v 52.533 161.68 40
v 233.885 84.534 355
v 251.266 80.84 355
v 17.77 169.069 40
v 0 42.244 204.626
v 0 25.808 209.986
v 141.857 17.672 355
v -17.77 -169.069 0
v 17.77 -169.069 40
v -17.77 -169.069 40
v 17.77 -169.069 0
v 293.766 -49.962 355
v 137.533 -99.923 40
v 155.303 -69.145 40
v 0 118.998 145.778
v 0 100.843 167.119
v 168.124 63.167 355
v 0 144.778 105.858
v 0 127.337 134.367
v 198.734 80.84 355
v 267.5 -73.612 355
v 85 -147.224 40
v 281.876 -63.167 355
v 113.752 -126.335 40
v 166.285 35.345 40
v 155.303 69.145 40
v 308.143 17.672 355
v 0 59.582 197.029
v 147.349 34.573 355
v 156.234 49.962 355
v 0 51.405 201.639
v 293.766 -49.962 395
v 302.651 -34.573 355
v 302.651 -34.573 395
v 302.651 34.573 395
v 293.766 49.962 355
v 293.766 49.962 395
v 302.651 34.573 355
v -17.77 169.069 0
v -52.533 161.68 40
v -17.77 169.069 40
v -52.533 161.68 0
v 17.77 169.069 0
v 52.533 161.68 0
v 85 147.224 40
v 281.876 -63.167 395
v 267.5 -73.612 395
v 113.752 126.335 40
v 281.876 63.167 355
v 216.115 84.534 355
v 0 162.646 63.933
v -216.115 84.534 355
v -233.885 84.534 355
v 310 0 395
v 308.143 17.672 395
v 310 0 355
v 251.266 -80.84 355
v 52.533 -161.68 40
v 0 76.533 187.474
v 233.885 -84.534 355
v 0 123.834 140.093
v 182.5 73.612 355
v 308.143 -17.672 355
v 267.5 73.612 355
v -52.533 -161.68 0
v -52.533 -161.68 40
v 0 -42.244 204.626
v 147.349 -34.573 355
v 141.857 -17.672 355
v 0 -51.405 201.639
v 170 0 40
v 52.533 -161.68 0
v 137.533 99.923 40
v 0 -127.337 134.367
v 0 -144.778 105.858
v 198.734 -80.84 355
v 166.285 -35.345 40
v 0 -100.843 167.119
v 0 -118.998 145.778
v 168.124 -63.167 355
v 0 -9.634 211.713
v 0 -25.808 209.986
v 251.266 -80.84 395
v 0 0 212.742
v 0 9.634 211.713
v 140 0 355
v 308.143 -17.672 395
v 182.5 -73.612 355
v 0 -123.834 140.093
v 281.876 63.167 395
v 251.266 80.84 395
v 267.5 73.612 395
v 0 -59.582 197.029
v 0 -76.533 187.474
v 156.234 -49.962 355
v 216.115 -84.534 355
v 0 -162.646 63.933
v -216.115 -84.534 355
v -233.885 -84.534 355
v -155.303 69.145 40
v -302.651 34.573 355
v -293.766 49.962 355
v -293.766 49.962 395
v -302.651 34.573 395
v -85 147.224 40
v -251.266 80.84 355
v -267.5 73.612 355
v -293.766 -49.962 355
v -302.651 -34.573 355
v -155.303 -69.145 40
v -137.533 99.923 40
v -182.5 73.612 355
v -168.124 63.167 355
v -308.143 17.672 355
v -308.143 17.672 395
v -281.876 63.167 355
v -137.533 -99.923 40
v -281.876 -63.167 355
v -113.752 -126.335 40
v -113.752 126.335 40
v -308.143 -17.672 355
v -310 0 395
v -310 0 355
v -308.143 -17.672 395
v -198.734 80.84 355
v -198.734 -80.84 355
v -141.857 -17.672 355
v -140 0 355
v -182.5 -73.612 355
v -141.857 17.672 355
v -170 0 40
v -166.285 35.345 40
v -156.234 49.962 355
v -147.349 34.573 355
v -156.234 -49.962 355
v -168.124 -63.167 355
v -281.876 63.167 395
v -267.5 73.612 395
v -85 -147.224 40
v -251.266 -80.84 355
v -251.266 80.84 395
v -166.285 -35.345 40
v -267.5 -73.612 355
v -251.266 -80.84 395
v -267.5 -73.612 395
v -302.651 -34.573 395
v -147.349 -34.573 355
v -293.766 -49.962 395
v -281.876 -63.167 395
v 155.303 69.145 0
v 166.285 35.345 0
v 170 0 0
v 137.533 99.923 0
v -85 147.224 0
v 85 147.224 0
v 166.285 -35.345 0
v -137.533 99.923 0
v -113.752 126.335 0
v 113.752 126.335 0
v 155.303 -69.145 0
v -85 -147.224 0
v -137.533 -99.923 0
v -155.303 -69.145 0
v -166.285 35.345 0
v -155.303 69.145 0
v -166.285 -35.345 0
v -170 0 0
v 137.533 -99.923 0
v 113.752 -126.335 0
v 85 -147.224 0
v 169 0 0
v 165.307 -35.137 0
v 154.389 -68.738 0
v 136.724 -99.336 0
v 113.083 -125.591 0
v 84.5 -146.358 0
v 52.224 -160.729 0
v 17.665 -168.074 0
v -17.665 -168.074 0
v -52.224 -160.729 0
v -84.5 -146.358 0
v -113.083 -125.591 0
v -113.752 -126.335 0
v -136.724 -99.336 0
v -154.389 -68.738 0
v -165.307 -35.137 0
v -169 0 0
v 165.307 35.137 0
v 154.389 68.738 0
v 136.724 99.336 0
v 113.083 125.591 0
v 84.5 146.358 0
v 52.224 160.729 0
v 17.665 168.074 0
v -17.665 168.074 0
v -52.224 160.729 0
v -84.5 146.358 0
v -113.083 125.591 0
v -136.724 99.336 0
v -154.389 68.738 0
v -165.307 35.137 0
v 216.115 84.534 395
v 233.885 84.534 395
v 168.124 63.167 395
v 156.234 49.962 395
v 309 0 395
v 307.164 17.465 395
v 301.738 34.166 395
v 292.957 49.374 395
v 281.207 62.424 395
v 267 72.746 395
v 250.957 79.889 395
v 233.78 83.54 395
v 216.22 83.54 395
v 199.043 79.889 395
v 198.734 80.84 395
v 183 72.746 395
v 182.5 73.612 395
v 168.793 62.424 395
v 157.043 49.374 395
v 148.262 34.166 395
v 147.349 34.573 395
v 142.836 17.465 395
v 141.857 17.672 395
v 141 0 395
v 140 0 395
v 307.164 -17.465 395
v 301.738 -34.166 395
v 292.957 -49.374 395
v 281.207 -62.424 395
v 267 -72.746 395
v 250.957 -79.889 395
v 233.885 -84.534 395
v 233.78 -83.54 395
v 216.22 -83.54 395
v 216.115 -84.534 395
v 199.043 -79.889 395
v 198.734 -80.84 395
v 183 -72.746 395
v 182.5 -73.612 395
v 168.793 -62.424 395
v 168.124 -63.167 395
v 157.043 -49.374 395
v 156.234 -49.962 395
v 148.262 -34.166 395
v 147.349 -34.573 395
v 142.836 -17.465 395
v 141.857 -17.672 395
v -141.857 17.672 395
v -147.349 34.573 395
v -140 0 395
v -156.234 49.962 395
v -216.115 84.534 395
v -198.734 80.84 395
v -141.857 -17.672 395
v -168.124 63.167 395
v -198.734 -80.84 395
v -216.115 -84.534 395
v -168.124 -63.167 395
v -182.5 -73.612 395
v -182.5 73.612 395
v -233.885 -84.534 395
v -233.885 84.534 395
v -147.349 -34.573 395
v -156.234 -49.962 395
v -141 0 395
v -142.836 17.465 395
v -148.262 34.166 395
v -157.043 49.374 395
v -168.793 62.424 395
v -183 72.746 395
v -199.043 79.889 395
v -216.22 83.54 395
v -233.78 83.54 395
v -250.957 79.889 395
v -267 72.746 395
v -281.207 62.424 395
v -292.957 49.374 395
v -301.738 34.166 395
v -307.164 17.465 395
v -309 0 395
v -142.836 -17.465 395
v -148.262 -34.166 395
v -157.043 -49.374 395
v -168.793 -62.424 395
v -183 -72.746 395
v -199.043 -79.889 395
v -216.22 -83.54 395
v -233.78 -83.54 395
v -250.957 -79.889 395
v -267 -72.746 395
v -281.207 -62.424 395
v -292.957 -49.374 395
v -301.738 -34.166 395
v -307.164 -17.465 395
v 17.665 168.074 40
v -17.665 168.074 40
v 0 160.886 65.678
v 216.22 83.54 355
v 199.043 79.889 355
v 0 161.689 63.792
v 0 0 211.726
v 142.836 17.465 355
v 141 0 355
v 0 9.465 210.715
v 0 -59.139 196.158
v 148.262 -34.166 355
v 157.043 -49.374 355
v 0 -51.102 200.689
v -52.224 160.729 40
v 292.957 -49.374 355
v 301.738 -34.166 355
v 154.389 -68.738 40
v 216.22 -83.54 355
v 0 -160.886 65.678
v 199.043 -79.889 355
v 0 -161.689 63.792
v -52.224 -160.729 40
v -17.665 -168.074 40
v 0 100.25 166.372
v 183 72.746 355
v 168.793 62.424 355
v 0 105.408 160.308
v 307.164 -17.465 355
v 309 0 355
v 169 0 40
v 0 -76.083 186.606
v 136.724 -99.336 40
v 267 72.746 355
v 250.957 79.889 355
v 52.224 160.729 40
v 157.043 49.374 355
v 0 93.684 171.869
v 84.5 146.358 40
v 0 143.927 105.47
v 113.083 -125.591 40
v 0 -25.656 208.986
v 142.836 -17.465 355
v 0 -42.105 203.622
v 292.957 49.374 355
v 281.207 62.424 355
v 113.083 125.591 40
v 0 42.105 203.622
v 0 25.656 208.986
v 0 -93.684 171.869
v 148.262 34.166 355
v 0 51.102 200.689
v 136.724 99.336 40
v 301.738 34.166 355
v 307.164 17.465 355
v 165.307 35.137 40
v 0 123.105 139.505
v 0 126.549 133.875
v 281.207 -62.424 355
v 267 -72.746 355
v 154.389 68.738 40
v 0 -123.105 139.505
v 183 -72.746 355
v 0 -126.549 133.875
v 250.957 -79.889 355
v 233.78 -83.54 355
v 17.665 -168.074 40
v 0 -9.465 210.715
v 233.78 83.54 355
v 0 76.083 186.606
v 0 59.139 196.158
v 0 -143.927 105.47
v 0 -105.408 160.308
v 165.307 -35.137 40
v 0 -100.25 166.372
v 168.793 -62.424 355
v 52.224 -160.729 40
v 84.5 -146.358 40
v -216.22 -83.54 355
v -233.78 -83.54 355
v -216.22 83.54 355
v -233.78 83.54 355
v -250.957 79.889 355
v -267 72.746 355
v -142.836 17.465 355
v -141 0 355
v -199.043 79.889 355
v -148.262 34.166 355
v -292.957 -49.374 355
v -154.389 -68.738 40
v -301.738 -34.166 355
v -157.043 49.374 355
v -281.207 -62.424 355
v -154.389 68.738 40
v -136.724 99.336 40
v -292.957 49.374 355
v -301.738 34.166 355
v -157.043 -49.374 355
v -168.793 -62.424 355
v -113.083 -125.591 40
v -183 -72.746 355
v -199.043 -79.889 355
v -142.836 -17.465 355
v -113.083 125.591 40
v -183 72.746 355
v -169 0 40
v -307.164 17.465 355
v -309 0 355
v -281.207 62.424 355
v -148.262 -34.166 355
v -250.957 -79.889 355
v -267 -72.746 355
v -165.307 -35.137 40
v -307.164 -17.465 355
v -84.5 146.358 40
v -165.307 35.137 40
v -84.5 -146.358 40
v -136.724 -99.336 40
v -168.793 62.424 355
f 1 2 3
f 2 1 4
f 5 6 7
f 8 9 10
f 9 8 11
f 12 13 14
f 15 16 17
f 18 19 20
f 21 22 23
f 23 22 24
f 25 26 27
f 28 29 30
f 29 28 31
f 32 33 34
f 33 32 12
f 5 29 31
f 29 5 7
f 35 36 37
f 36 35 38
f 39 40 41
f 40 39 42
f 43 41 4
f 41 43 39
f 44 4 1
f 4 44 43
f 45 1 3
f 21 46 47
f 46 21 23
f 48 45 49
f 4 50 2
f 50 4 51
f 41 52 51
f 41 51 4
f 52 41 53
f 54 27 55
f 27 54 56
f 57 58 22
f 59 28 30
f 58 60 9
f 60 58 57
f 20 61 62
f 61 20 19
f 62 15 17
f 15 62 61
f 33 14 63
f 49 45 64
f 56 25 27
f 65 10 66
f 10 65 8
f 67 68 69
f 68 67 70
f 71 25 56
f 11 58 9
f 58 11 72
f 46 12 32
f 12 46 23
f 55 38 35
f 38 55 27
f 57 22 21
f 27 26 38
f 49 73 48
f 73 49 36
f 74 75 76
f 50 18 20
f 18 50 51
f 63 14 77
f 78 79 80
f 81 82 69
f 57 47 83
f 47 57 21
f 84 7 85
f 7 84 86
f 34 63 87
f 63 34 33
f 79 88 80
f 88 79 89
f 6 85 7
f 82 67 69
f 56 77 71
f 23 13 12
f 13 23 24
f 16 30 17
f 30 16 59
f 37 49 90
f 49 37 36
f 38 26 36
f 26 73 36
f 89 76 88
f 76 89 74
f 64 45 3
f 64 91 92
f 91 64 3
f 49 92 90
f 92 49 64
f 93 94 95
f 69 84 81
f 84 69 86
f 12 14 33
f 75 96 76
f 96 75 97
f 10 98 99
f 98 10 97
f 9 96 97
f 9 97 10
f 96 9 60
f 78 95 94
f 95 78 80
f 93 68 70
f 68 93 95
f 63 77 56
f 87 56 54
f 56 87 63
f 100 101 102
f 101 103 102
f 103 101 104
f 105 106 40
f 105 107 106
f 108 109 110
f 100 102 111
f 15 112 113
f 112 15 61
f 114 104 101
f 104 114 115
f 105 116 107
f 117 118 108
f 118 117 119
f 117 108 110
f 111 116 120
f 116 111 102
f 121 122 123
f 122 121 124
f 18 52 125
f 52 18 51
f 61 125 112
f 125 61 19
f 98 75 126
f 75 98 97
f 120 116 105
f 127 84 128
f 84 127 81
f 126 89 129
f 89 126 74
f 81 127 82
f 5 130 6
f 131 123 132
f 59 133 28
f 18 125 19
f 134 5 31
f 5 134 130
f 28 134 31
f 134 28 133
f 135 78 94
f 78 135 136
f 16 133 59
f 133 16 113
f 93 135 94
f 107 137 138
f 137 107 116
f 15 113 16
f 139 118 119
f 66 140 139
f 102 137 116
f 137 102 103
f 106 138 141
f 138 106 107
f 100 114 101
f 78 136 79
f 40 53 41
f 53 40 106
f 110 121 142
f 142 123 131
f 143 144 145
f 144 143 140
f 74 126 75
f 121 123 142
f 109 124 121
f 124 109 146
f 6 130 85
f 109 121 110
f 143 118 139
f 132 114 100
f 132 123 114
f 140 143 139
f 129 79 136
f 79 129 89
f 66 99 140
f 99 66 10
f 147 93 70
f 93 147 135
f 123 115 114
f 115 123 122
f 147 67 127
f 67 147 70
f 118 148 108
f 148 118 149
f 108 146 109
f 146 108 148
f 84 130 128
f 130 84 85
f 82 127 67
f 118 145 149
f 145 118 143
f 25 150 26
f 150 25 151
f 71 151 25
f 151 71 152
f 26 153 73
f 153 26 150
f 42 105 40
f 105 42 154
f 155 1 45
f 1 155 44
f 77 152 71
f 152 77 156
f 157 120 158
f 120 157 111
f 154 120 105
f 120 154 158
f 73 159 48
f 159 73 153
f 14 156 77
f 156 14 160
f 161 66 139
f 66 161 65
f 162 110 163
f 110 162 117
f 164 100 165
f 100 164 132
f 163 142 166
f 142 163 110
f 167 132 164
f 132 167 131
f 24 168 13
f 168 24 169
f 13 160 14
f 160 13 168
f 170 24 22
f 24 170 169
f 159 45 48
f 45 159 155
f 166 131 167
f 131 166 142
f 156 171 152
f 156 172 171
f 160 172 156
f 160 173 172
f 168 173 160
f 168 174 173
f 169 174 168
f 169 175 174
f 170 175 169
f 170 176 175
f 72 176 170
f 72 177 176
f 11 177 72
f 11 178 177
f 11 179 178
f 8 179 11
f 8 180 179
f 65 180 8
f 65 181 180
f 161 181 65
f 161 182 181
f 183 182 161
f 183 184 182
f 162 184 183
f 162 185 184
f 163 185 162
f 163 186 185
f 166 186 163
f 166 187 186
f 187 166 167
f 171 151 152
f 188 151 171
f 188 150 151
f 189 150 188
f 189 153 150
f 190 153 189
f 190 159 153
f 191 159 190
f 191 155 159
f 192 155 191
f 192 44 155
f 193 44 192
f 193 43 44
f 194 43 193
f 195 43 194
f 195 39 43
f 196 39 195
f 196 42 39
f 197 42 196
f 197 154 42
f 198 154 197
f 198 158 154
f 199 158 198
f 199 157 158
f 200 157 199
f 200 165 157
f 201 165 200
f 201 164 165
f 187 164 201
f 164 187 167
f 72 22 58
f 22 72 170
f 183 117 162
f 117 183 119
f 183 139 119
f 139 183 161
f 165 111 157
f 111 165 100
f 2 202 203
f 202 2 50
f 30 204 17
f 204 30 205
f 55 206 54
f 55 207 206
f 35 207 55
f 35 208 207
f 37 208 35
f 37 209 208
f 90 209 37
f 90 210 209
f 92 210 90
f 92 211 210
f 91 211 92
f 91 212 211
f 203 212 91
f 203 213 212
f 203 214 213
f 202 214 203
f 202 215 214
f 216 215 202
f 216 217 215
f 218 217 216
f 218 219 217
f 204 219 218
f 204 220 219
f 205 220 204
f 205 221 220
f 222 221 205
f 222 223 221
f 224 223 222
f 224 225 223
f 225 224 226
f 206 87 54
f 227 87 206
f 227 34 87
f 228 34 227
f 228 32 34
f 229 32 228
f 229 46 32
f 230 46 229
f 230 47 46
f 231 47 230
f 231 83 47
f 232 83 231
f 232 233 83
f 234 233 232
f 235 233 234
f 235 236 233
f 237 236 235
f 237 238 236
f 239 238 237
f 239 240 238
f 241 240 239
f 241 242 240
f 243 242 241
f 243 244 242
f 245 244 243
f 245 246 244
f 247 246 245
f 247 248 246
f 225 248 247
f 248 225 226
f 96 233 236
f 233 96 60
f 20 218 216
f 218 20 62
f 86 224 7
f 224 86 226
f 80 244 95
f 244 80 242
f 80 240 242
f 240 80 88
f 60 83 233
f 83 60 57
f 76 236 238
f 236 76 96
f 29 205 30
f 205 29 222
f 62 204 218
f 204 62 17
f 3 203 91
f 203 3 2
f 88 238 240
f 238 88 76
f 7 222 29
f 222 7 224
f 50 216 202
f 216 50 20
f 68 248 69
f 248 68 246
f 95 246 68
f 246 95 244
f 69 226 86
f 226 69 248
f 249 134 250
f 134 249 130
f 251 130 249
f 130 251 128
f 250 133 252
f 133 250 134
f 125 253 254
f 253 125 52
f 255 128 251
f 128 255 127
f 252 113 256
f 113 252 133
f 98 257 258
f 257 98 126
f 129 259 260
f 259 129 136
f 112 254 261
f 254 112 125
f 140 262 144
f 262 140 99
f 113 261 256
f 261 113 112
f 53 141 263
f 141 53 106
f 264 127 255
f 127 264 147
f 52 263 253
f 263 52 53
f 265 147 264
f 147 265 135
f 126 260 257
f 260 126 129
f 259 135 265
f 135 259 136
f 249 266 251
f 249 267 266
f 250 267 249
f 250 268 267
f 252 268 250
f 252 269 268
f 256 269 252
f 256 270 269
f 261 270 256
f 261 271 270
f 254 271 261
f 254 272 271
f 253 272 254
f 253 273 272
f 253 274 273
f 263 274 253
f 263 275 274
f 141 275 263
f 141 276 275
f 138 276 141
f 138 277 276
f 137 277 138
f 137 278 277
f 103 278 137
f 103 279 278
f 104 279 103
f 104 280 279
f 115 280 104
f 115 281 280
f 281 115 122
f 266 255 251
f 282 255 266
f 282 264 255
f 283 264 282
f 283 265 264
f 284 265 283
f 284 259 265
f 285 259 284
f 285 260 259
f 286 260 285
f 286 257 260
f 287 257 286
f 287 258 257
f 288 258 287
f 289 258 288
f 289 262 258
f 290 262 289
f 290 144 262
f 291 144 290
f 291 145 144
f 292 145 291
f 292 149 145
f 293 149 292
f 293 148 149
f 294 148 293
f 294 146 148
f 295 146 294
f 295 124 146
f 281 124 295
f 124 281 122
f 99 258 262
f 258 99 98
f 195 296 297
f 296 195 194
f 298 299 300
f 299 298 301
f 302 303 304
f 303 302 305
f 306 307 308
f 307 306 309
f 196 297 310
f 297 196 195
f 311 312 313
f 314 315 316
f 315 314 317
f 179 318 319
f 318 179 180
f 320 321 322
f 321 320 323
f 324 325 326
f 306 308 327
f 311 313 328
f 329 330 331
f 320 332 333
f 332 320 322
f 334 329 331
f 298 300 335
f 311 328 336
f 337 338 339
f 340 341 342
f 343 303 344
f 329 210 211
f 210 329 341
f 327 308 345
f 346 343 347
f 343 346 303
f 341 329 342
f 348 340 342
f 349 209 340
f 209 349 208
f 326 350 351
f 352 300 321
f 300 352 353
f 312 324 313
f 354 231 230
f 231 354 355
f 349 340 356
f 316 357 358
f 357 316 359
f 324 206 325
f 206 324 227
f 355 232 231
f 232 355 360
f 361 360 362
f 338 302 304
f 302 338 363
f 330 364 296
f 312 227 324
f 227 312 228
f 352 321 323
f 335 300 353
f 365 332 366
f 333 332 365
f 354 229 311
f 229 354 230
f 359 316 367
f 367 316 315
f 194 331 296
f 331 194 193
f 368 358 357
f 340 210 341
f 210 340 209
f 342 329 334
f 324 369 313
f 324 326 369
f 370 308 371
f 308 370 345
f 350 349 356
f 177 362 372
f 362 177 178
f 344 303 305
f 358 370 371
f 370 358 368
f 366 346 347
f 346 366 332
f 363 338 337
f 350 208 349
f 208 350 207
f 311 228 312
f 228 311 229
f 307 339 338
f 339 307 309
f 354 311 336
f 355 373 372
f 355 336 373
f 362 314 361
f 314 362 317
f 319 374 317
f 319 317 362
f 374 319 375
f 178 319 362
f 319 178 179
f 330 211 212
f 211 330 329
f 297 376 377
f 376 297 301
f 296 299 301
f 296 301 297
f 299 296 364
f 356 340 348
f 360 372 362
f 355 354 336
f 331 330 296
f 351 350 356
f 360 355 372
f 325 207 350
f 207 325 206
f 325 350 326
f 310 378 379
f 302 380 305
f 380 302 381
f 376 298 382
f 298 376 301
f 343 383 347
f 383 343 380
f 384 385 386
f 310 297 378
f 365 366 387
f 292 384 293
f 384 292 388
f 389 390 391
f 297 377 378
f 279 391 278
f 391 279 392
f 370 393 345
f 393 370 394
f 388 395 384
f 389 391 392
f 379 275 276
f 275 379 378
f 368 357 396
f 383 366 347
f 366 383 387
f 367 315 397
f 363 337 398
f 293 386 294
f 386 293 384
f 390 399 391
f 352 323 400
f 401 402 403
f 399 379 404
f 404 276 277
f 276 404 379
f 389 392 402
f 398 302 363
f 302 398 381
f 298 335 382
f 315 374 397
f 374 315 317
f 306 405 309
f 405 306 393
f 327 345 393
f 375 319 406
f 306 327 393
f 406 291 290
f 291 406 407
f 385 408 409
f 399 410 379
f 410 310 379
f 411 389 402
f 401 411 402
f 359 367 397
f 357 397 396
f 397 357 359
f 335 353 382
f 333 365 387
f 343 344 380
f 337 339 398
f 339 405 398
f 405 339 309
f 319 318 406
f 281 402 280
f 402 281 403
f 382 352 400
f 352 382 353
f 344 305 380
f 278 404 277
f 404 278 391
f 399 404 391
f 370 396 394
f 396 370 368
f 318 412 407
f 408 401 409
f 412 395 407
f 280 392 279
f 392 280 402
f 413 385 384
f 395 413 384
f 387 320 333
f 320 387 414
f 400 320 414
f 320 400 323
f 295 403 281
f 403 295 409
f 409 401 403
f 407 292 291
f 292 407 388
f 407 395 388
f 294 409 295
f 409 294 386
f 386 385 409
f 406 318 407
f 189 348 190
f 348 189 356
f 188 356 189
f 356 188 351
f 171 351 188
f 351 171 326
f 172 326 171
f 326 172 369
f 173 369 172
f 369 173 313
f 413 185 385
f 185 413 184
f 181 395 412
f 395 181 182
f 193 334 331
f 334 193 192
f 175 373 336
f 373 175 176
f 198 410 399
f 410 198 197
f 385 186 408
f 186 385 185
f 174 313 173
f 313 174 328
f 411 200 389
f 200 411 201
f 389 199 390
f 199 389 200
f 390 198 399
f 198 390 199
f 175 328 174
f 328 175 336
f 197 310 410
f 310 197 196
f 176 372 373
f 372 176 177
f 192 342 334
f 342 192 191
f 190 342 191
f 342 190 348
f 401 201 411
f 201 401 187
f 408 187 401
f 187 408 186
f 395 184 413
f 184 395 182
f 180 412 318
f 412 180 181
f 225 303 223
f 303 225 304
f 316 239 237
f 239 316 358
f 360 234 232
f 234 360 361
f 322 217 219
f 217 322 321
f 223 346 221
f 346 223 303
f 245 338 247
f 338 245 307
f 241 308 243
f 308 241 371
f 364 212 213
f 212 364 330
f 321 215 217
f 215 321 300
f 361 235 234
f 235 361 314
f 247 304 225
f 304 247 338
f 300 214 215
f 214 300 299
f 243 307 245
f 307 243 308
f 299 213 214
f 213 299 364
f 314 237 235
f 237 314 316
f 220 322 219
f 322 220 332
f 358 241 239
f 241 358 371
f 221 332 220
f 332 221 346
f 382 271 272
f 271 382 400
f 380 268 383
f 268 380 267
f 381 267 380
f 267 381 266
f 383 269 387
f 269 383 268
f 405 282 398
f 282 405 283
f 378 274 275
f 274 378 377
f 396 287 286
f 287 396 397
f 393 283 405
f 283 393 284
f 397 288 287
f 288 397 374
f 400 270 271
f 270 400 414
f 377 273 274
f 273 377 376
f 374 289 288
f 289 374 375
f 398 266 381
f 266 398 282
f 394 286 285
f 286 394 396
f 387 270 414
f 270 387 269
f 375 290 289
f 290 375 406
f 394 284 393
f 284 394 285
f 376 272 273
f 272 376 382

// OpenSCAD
v1 = 340;
v2 = 170;
v3 = 338;
v4 = 168;

module loft(d1, d2) {
    hull() {
        translate([0, 0, 40])
        cylinder(h = 0.00001, d = d1);
        
        translate([225, 0, 355])
        cylinder(h = 0.00001, d = d2);
    }
}

difference() {
    union() {
        loft(d1 = v1, d2 = v2);
        mirror([1, 0, 0]) loft(d1 = v1, d2 = v2);
        
        cylinder(h = 40, d = v1);
        
        translate([225, 0, 355])
        cylinder(h = 40, d = v2);
        
        translate([-225, 0, 355])
        cylinder(h = 40, d = v2);
    }
    
    union() {
        loft(d1 = v3, d2 = v4);
        mirror([1, 0, 0]) loft(d1 = v3, d2 = v4);
        
        cylinder(h = 40, d = v3);
        
        translate([225, 0, 355])
        cylinder(h = 40, d = v4);
        
        translate([-225, 0, 355])
        cylinder(h = 40, d = v4);
    }
}
